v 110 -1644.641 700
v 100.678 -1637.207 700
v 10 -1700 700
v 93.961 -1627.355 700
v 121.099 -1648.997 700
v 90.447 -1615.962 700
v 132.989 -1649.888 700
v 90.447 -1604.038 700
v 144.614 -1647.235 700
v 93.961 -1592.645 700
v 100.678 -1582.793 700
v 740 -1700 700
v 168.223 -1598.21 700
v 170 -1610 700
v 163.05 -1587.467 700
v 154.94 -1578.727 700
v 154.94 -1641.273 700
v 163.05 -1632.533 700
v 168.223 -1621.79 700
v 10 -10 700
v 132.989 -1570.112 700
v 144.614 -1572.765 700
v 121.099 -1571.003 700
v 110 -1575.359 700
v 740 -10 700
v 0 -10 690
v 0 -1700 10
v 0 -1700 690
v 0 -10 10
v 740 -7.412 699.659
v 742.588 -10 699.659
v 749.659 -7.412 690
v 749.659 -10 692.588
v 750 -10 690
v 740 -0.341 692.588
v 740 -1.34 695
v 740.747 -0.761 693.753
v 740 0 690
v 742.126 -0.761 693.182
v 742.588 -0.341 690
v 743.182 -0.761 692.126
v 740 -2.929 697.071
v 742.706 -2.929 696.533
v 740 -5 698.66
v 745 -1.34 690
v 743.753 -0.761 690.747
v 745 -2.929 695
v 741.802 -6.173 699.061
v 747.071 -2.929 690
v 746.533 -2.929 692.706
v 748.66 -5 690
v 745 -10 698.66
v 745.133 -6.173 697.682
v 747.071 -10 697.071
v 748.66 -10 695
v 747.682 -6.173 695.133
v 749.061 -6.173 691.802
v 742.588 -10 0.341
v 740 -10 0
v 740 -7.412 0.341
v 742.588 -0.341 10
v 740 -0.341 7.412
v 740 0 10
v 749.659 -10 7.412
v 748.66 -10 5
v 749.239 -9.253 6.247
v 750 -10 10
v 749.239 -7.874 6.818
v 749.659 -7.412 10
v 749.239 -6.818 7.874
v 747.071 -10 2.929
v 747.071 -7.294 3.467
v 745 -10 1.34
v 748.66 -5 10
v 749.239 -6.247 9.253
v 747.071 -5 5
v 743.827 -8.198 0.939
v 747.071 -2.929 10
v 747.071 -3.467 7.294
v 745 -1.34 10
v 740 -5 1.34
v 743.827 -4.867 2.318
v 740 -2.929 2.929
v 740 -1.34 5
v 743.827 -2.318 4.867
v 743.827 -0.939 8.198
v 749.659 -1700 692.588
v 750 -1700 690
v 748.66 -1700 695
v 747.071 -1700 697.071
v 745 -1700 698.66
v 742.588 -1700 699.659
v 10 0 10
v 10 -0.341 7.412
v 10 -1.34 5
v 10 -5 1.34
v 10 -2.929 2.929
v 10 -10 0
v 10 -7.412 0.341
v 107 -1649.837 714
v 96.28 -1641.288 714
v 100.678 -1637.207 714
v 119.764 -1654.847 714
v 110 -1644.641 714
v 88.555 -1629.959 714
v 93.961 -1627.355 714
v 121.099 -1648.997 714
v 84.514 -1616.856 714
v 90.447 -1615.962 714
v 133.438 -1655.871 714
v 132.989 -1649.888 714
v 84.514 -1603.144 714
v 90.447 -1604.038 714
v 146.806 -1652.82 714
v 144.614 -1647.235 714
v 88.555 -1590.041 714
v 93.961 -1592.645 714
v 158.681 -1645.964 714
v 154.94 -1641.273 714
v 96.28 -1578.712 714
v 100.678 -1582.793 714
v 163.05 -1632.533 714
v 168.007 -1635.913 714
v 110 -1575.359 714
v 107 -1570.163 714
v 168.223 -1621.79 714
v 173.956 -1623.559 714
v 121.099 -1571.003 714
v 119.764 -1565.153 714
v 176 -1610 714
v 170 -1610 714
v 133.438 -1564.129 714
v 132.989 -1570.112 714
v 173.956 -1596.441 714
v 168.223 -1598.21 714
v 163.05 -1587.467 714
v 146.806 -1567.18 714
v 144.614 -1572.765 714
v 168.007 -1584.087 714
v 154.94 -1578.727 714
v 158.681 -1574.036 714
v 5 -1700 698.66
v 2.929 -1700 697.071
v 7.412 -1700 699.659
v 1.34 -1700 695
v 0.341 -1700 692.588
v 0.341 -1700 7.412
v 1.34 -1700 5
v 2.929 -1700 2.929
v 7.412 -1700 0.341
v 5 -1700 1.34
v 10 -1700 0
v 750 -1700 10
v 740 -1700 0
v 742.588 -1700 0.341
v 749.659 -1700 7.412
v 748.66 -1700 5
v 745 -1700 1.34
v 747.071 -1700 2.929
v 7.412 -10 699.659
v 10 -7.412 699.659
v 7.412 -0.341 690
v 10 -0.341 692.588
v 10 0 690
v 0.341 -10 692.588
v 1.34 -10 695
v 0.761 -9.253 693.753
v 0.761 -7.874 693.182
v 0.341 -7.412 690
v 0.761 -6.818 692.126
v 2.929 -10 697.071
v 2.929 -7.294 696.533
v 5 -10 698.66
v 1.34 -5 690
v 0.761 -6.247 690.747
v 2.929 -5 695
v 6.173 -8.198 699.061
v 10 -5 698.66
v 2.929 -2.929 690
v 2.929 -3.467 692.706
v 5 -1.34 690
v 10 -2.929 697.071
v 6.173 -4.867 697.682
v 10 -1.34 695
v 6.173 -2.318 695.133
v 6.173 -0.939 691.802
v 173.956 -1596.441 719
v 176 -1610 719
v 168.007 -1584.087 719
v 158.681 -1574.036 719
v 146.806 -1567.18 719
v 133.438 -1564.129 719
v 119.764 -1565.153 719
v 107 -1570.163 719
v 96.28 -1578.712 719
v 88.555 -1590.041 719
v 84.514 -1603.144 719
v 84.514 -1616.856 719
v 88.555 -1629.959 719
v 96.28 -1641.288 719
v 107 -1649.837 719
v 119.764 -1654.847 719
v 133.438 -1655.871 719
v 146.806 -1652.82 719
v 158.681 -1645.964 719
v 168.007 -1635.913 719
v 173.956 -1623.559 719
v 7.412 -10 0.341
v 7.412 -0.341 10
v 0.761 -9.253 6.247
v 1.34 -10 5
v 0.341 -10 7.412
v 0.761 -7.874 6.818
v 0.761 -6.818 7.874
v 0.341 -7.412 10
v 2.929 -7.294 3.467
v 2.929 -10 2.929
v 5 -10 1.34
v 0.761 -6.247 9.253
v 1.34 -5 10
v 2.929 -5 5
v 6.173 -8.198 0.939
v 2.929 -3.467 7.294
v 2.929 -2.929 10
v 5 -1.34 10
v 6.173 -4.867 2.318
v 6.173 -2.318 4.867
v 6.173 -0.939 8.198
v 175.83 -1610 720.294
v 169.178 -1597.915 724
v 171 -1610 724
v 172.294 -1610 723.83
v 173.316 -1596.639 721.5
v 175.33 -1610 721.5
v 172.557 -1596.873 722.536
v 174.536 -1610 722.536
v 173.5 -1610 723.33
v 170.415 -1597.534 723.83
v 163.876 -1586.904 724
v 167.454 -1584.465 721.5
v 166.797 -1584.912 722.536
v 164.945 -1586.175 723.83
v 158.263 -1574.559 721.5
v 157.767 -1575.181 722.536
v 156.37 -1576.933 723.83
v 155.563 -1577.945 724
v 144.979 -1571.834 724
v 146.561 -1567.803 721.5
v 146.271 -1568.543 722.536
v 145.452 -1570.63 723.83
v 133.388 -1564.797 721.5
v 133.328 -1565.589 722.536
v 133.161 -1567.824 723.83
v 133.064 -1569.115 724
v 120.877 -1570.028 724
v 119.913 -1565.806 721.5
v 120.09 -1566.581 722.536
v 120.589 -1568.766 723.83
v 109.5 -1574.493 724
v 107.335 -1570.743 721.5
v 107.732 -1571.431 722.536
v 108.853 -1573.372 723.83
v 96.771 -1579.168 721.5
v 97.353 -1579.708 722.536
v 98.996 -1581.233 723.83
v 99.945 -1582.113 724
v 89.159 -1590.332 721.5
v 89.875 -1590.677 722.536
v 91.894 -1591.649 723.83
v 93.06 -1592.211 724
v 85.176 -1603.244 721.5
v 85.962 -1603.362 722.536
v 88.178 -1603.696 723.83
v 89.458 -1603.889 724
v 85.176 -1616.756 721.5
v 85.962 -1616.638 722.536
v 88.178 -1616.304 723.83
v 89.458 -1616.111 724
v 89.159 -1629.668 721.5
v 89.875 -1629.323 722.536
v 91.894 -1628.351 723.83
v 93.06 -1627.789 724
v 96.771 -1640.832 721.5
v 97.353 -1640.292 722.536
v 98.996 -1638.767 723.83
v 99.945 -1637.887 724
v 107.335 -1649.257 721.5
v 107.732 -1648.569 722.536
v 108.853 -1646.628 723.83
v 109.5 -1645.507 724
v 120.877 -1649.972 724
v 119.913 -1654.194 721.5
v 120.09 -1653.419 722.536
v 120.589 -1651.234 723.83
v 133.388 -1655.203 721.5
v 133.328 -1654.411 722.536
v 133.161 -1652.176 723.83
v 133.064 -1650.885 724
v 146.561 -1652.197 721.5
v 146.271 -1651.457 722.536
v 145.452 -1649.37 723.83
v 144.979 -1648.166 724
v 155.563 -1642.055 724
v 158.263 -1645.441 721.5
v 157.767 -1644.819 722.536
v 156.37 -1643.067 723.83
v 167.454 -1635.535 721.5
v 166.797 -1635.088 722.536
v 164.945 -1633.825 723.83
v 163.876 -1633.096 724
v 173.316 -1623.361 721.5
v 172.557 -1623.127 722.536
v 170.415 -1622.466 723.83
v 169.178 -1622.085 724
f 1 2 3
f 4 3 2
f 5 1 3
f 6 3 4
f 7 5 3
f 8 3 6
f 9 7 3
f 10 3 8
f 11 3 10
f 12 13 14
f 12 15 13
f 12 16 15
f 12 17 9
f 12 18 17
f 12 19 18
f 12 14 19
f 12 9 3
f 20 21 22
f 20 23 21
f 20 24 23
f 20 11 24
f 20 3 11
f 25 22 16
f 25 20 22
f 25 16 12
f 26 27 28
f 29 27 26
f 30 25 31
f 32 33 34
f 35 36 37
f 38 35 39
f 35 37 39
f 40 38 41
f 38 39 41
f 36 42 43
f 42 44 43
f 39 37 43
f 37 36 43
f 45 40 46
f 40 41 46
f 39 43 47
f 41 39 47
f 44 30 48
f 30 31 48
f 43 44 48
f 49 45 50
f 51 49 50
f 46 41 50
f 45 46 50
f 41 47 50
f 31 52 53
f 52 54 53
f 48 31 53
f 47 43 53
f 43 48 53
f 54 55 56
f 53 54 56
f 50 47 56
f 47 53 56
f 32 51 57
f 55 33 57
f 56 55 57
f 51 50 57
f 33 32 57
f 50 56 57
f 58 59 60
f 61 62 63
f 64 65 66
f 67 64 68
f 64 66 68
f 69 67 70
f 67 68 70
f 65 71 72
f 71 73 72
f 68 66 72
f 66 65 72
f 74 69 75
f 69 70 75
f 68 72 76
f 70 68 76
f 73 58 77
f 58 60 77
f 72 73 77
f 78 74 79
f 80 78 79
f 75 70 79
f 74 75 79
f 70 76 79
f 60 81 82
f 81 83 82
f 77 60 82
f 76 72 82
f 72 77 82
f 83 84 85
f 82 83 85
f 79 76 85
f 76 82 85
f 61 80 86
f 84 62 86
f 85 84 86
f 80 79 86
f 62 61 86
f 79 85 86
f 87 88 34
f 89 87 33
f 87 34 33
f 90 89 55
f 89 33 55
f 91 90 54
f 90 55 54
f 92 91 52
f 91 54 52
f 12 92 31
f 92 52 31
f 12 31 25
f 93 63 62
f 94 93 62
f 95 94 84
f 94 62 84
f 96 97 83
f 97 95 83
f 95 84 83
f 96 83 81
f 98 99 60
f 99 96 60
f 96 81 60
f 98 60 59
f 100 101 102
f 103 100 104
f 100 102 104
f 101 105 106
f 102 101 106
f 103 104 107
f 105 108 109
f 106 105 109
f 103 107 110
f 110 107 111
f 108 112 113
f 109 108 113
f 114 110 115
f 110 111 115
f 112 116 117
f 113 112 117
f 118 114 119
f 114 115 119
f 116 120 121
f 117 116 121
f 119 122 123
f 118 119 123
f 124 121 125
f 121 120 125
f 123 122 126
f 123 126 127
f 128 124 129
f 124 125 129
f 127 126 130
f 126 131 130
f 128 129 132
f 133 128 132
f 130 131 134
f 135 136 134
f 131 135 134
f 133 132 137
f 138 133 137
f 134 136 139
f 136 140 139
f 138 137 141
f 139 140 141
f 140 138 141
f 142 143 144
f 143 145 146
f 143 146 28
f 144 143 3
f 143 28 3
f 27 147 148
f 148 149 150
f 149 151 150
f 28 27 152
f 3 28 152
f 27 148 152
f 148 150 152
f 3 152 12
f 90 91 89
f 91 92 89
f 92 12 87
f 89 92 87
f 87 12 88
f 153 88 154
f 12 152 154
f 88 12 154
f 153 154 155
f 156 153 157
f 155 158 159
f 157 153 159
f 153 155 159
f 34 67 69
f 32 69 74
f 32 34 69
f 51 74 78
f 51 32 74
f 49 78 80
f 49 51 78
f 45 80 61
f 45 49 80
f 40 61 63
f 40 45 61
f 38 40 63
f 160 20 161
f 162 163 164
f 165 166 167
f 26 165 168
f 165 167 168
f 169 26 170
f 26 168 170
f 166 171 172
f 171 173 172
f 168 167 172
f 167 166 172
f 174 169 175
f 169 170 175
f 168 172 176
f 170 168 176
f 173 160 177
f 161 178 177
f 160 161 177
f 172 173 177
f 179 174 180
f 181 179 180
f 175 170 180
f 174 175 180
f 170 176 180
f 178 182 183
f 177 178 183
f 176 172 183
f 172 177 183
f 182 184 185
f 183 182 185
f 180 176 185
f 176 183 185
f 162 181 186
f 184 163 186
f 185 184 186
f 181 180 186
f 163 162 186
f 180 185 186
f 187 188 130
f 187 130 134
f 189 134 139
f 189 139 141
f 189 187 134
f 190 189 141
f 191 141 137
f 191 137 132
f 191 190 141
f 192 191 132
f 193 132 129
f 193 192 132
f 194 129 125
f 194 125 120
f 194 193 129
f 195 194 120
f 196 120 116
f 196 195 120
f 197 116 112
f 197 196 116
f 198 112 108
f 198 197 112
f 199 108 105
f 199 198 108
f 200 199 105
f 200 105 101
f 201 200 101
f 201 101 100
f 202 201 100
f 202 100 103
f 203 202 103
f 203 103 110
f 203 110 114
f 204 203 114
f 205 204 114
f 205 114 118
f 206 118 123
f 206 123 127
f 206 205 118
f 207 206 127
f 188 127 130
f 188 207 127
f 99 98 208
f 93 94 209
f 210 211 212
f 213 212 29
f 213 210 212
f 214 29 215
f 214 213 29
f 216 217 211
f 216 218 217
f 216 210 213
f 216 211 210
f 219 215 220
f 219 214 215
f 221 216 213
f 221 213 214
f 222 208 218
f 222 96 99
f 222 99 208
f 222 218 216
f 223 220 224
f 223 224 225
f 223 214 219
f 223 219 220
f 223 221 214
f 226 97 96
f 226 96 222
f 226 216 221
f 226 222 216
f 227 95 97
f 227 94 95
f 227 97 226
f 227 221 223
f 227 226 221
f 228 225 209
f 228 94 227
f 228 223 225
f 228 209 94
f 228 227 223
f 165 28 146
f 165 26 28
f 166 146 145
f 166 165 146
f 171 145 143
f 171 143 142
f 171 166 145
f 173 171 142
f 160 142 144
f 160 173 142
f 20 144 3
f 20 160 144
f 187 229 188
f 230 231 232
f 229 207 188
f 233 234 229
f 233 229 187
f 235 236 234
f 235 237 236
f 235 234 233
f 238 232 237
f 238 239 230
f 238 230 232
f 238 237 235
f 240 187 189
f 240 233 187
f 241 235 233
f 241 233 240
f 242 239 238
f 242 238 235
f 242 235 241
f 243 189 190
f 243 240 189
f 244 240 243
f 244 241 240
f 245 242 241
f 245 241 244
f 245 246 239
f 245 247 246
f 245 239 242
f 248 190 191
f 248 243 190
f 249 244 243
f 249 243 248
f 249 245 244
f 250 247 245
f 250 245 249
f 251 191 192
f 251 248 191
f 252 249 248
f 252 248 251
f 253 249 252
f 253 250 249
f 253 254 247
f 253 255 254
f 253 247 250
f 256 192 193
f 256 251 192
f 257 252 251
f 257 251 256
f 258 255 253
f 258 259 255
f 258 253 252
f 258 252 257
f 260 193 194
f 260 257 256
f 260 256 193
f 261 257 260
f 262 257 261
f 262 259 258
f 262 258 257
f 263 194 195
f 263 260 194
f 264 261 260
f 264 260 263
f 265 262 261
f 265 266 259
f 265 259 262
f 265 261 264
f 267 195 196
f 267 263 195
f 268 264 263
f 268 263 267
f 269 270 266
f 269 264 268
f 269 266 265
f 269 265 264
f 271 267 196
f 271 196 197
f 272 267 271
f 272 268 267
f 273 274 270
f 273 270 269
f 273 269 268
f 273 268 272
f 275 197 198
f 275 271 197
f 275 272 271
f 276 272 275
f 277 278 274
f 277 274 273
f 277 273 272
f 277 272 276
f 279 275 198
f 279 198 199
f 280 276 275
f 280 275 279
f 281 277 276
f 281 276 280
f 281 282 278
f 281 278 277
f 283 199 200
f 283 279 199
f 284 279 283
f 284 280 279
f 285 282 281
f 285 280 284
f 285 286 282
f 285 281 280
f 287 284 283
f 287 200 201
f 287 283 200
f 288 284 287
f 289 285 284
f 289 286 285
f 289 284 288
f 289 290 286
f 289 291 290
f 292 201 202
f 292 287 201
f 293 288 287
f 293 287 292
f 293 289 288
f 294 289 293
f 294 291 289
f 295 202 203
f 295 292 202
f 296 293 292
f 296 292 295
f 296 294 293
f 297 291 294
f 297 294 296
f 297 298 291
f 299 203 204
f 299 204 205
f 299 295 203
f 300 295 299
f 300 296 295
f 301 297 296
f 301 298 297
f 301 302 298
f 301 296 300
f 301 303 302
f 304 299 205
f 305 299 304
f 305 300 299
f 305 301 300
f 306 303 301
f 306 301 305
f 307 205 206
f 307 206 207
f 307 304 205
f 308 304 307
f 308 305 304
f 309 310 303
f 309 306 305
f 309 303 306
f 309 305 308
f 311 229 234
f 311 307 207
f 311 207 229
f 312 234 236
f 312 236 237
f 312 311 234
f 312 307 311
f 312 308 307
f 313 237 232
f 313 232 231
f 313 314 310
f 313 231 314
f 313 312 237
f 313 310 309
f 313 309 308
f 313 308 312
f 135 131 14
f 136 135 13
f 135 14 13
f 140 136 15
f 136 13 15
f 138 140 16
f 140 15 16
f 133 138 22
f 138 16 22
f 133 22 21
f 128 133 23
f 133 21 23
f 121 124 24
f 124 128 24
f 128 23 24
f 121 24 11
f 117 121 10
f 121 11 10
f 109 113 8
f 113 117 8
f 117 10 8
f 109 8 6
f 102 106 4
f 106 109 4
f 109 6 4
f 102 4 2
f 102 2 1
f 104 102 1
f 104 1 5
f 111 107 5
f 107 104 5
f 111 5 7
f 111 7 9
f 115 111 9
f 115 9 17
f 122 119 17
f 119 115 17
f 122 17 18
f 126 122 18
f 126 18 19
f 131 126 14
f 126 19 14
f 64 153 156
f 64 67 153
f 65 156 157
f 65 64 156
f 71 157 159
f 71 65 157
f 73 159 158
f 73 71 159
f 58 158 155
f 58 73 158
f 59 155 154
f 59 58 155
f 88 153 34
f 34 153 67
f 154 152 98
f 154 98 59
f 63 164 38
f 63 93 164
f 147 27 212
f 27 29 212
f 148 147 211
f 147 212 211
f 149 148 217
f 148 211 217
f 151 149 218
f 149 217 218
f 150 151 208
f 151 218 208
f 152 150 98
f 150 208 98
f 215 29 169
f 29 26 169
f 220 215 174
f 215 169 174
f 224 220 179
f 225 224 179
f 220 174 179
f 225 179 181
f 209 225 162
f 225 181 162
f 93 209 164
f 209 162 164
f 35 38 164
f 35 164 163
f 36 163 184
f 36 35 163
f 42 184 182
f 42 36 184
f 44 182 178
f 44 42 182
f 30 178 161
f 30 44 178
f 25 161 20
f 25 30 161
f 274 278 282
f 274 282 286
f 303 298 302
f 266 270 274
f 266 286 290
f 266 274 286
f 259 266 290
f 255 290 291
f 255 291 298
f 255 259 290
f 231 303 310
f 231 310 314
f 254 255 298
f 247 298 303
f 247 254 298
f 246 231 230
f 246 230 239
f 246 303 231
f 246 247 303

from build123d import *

# Parameters (mm, degrees)
CROQUIS1_W              = 750
CROQUIS1_H              = 1700
SALIENTE_EXTRUIR1_DEPTH = 700
REDONDEO1_R             = 10
CROQUIS2_R              = 40
SALIENTE_EXTRUIR2_DEPTH = 24
CROQUIS3_R              = 46
SALIENTE_EXTRUIR3_DEPTH = 10
REDONDEO2_R             = 5


with BuildPart() as part:
    # Croquis1 → Saliente-Extruir1 (new body)
    with BuildSketch(Plane.XY):
        with Locations((375, -850)):
            Rectangle(CROQUIS1_W, CROQUIS1_H)
    extrude(amount=SALIENTE_EXTRUIR1_DEPTH)

    # Redondeo1
    redondeo1_edges = [part.edges().sort_by_distance(p)[0] for p in [
        (750, -850, 700),
        (375, 0, 700),
        (0, -850, 700),
        (375, 0, 0),
        (750, -850, 0),
        (0, -850, 0),
        (0, 0, 350),
        (750, 0, 350),
    ]]
    fillet(redondeo1_edges, radius=REDONDEO1_R)

    # Croquis2 → Saliente-Extruir2 (add)
    with BuildSketch(Plane.XY.offset(700)):
        with Locations((130, -1610)):
            Circle(CROQUIS2_R)
    extrude(amount=SALIENTE_EXTRUIR2_DEPTH)

    # Croquis3 → Saliente-Extruir3 (add)
    with BuildSketch(Plane.XY.offset(724)):
        with Locations((130, -1610)):
            Circle(CROQUIS3_R)
    extrude(amount=-SALIENTE_EXTRUIR3_DEPTH)

    # Redondeo2
    redondeo2_edges = [part.edges().sort_by_distance(p)[0] for p in [
        (84, -1610, 724),
    ]]
    fillet(redondeo2_edges, radius=REDONDEO2_R)


solid = part.part
